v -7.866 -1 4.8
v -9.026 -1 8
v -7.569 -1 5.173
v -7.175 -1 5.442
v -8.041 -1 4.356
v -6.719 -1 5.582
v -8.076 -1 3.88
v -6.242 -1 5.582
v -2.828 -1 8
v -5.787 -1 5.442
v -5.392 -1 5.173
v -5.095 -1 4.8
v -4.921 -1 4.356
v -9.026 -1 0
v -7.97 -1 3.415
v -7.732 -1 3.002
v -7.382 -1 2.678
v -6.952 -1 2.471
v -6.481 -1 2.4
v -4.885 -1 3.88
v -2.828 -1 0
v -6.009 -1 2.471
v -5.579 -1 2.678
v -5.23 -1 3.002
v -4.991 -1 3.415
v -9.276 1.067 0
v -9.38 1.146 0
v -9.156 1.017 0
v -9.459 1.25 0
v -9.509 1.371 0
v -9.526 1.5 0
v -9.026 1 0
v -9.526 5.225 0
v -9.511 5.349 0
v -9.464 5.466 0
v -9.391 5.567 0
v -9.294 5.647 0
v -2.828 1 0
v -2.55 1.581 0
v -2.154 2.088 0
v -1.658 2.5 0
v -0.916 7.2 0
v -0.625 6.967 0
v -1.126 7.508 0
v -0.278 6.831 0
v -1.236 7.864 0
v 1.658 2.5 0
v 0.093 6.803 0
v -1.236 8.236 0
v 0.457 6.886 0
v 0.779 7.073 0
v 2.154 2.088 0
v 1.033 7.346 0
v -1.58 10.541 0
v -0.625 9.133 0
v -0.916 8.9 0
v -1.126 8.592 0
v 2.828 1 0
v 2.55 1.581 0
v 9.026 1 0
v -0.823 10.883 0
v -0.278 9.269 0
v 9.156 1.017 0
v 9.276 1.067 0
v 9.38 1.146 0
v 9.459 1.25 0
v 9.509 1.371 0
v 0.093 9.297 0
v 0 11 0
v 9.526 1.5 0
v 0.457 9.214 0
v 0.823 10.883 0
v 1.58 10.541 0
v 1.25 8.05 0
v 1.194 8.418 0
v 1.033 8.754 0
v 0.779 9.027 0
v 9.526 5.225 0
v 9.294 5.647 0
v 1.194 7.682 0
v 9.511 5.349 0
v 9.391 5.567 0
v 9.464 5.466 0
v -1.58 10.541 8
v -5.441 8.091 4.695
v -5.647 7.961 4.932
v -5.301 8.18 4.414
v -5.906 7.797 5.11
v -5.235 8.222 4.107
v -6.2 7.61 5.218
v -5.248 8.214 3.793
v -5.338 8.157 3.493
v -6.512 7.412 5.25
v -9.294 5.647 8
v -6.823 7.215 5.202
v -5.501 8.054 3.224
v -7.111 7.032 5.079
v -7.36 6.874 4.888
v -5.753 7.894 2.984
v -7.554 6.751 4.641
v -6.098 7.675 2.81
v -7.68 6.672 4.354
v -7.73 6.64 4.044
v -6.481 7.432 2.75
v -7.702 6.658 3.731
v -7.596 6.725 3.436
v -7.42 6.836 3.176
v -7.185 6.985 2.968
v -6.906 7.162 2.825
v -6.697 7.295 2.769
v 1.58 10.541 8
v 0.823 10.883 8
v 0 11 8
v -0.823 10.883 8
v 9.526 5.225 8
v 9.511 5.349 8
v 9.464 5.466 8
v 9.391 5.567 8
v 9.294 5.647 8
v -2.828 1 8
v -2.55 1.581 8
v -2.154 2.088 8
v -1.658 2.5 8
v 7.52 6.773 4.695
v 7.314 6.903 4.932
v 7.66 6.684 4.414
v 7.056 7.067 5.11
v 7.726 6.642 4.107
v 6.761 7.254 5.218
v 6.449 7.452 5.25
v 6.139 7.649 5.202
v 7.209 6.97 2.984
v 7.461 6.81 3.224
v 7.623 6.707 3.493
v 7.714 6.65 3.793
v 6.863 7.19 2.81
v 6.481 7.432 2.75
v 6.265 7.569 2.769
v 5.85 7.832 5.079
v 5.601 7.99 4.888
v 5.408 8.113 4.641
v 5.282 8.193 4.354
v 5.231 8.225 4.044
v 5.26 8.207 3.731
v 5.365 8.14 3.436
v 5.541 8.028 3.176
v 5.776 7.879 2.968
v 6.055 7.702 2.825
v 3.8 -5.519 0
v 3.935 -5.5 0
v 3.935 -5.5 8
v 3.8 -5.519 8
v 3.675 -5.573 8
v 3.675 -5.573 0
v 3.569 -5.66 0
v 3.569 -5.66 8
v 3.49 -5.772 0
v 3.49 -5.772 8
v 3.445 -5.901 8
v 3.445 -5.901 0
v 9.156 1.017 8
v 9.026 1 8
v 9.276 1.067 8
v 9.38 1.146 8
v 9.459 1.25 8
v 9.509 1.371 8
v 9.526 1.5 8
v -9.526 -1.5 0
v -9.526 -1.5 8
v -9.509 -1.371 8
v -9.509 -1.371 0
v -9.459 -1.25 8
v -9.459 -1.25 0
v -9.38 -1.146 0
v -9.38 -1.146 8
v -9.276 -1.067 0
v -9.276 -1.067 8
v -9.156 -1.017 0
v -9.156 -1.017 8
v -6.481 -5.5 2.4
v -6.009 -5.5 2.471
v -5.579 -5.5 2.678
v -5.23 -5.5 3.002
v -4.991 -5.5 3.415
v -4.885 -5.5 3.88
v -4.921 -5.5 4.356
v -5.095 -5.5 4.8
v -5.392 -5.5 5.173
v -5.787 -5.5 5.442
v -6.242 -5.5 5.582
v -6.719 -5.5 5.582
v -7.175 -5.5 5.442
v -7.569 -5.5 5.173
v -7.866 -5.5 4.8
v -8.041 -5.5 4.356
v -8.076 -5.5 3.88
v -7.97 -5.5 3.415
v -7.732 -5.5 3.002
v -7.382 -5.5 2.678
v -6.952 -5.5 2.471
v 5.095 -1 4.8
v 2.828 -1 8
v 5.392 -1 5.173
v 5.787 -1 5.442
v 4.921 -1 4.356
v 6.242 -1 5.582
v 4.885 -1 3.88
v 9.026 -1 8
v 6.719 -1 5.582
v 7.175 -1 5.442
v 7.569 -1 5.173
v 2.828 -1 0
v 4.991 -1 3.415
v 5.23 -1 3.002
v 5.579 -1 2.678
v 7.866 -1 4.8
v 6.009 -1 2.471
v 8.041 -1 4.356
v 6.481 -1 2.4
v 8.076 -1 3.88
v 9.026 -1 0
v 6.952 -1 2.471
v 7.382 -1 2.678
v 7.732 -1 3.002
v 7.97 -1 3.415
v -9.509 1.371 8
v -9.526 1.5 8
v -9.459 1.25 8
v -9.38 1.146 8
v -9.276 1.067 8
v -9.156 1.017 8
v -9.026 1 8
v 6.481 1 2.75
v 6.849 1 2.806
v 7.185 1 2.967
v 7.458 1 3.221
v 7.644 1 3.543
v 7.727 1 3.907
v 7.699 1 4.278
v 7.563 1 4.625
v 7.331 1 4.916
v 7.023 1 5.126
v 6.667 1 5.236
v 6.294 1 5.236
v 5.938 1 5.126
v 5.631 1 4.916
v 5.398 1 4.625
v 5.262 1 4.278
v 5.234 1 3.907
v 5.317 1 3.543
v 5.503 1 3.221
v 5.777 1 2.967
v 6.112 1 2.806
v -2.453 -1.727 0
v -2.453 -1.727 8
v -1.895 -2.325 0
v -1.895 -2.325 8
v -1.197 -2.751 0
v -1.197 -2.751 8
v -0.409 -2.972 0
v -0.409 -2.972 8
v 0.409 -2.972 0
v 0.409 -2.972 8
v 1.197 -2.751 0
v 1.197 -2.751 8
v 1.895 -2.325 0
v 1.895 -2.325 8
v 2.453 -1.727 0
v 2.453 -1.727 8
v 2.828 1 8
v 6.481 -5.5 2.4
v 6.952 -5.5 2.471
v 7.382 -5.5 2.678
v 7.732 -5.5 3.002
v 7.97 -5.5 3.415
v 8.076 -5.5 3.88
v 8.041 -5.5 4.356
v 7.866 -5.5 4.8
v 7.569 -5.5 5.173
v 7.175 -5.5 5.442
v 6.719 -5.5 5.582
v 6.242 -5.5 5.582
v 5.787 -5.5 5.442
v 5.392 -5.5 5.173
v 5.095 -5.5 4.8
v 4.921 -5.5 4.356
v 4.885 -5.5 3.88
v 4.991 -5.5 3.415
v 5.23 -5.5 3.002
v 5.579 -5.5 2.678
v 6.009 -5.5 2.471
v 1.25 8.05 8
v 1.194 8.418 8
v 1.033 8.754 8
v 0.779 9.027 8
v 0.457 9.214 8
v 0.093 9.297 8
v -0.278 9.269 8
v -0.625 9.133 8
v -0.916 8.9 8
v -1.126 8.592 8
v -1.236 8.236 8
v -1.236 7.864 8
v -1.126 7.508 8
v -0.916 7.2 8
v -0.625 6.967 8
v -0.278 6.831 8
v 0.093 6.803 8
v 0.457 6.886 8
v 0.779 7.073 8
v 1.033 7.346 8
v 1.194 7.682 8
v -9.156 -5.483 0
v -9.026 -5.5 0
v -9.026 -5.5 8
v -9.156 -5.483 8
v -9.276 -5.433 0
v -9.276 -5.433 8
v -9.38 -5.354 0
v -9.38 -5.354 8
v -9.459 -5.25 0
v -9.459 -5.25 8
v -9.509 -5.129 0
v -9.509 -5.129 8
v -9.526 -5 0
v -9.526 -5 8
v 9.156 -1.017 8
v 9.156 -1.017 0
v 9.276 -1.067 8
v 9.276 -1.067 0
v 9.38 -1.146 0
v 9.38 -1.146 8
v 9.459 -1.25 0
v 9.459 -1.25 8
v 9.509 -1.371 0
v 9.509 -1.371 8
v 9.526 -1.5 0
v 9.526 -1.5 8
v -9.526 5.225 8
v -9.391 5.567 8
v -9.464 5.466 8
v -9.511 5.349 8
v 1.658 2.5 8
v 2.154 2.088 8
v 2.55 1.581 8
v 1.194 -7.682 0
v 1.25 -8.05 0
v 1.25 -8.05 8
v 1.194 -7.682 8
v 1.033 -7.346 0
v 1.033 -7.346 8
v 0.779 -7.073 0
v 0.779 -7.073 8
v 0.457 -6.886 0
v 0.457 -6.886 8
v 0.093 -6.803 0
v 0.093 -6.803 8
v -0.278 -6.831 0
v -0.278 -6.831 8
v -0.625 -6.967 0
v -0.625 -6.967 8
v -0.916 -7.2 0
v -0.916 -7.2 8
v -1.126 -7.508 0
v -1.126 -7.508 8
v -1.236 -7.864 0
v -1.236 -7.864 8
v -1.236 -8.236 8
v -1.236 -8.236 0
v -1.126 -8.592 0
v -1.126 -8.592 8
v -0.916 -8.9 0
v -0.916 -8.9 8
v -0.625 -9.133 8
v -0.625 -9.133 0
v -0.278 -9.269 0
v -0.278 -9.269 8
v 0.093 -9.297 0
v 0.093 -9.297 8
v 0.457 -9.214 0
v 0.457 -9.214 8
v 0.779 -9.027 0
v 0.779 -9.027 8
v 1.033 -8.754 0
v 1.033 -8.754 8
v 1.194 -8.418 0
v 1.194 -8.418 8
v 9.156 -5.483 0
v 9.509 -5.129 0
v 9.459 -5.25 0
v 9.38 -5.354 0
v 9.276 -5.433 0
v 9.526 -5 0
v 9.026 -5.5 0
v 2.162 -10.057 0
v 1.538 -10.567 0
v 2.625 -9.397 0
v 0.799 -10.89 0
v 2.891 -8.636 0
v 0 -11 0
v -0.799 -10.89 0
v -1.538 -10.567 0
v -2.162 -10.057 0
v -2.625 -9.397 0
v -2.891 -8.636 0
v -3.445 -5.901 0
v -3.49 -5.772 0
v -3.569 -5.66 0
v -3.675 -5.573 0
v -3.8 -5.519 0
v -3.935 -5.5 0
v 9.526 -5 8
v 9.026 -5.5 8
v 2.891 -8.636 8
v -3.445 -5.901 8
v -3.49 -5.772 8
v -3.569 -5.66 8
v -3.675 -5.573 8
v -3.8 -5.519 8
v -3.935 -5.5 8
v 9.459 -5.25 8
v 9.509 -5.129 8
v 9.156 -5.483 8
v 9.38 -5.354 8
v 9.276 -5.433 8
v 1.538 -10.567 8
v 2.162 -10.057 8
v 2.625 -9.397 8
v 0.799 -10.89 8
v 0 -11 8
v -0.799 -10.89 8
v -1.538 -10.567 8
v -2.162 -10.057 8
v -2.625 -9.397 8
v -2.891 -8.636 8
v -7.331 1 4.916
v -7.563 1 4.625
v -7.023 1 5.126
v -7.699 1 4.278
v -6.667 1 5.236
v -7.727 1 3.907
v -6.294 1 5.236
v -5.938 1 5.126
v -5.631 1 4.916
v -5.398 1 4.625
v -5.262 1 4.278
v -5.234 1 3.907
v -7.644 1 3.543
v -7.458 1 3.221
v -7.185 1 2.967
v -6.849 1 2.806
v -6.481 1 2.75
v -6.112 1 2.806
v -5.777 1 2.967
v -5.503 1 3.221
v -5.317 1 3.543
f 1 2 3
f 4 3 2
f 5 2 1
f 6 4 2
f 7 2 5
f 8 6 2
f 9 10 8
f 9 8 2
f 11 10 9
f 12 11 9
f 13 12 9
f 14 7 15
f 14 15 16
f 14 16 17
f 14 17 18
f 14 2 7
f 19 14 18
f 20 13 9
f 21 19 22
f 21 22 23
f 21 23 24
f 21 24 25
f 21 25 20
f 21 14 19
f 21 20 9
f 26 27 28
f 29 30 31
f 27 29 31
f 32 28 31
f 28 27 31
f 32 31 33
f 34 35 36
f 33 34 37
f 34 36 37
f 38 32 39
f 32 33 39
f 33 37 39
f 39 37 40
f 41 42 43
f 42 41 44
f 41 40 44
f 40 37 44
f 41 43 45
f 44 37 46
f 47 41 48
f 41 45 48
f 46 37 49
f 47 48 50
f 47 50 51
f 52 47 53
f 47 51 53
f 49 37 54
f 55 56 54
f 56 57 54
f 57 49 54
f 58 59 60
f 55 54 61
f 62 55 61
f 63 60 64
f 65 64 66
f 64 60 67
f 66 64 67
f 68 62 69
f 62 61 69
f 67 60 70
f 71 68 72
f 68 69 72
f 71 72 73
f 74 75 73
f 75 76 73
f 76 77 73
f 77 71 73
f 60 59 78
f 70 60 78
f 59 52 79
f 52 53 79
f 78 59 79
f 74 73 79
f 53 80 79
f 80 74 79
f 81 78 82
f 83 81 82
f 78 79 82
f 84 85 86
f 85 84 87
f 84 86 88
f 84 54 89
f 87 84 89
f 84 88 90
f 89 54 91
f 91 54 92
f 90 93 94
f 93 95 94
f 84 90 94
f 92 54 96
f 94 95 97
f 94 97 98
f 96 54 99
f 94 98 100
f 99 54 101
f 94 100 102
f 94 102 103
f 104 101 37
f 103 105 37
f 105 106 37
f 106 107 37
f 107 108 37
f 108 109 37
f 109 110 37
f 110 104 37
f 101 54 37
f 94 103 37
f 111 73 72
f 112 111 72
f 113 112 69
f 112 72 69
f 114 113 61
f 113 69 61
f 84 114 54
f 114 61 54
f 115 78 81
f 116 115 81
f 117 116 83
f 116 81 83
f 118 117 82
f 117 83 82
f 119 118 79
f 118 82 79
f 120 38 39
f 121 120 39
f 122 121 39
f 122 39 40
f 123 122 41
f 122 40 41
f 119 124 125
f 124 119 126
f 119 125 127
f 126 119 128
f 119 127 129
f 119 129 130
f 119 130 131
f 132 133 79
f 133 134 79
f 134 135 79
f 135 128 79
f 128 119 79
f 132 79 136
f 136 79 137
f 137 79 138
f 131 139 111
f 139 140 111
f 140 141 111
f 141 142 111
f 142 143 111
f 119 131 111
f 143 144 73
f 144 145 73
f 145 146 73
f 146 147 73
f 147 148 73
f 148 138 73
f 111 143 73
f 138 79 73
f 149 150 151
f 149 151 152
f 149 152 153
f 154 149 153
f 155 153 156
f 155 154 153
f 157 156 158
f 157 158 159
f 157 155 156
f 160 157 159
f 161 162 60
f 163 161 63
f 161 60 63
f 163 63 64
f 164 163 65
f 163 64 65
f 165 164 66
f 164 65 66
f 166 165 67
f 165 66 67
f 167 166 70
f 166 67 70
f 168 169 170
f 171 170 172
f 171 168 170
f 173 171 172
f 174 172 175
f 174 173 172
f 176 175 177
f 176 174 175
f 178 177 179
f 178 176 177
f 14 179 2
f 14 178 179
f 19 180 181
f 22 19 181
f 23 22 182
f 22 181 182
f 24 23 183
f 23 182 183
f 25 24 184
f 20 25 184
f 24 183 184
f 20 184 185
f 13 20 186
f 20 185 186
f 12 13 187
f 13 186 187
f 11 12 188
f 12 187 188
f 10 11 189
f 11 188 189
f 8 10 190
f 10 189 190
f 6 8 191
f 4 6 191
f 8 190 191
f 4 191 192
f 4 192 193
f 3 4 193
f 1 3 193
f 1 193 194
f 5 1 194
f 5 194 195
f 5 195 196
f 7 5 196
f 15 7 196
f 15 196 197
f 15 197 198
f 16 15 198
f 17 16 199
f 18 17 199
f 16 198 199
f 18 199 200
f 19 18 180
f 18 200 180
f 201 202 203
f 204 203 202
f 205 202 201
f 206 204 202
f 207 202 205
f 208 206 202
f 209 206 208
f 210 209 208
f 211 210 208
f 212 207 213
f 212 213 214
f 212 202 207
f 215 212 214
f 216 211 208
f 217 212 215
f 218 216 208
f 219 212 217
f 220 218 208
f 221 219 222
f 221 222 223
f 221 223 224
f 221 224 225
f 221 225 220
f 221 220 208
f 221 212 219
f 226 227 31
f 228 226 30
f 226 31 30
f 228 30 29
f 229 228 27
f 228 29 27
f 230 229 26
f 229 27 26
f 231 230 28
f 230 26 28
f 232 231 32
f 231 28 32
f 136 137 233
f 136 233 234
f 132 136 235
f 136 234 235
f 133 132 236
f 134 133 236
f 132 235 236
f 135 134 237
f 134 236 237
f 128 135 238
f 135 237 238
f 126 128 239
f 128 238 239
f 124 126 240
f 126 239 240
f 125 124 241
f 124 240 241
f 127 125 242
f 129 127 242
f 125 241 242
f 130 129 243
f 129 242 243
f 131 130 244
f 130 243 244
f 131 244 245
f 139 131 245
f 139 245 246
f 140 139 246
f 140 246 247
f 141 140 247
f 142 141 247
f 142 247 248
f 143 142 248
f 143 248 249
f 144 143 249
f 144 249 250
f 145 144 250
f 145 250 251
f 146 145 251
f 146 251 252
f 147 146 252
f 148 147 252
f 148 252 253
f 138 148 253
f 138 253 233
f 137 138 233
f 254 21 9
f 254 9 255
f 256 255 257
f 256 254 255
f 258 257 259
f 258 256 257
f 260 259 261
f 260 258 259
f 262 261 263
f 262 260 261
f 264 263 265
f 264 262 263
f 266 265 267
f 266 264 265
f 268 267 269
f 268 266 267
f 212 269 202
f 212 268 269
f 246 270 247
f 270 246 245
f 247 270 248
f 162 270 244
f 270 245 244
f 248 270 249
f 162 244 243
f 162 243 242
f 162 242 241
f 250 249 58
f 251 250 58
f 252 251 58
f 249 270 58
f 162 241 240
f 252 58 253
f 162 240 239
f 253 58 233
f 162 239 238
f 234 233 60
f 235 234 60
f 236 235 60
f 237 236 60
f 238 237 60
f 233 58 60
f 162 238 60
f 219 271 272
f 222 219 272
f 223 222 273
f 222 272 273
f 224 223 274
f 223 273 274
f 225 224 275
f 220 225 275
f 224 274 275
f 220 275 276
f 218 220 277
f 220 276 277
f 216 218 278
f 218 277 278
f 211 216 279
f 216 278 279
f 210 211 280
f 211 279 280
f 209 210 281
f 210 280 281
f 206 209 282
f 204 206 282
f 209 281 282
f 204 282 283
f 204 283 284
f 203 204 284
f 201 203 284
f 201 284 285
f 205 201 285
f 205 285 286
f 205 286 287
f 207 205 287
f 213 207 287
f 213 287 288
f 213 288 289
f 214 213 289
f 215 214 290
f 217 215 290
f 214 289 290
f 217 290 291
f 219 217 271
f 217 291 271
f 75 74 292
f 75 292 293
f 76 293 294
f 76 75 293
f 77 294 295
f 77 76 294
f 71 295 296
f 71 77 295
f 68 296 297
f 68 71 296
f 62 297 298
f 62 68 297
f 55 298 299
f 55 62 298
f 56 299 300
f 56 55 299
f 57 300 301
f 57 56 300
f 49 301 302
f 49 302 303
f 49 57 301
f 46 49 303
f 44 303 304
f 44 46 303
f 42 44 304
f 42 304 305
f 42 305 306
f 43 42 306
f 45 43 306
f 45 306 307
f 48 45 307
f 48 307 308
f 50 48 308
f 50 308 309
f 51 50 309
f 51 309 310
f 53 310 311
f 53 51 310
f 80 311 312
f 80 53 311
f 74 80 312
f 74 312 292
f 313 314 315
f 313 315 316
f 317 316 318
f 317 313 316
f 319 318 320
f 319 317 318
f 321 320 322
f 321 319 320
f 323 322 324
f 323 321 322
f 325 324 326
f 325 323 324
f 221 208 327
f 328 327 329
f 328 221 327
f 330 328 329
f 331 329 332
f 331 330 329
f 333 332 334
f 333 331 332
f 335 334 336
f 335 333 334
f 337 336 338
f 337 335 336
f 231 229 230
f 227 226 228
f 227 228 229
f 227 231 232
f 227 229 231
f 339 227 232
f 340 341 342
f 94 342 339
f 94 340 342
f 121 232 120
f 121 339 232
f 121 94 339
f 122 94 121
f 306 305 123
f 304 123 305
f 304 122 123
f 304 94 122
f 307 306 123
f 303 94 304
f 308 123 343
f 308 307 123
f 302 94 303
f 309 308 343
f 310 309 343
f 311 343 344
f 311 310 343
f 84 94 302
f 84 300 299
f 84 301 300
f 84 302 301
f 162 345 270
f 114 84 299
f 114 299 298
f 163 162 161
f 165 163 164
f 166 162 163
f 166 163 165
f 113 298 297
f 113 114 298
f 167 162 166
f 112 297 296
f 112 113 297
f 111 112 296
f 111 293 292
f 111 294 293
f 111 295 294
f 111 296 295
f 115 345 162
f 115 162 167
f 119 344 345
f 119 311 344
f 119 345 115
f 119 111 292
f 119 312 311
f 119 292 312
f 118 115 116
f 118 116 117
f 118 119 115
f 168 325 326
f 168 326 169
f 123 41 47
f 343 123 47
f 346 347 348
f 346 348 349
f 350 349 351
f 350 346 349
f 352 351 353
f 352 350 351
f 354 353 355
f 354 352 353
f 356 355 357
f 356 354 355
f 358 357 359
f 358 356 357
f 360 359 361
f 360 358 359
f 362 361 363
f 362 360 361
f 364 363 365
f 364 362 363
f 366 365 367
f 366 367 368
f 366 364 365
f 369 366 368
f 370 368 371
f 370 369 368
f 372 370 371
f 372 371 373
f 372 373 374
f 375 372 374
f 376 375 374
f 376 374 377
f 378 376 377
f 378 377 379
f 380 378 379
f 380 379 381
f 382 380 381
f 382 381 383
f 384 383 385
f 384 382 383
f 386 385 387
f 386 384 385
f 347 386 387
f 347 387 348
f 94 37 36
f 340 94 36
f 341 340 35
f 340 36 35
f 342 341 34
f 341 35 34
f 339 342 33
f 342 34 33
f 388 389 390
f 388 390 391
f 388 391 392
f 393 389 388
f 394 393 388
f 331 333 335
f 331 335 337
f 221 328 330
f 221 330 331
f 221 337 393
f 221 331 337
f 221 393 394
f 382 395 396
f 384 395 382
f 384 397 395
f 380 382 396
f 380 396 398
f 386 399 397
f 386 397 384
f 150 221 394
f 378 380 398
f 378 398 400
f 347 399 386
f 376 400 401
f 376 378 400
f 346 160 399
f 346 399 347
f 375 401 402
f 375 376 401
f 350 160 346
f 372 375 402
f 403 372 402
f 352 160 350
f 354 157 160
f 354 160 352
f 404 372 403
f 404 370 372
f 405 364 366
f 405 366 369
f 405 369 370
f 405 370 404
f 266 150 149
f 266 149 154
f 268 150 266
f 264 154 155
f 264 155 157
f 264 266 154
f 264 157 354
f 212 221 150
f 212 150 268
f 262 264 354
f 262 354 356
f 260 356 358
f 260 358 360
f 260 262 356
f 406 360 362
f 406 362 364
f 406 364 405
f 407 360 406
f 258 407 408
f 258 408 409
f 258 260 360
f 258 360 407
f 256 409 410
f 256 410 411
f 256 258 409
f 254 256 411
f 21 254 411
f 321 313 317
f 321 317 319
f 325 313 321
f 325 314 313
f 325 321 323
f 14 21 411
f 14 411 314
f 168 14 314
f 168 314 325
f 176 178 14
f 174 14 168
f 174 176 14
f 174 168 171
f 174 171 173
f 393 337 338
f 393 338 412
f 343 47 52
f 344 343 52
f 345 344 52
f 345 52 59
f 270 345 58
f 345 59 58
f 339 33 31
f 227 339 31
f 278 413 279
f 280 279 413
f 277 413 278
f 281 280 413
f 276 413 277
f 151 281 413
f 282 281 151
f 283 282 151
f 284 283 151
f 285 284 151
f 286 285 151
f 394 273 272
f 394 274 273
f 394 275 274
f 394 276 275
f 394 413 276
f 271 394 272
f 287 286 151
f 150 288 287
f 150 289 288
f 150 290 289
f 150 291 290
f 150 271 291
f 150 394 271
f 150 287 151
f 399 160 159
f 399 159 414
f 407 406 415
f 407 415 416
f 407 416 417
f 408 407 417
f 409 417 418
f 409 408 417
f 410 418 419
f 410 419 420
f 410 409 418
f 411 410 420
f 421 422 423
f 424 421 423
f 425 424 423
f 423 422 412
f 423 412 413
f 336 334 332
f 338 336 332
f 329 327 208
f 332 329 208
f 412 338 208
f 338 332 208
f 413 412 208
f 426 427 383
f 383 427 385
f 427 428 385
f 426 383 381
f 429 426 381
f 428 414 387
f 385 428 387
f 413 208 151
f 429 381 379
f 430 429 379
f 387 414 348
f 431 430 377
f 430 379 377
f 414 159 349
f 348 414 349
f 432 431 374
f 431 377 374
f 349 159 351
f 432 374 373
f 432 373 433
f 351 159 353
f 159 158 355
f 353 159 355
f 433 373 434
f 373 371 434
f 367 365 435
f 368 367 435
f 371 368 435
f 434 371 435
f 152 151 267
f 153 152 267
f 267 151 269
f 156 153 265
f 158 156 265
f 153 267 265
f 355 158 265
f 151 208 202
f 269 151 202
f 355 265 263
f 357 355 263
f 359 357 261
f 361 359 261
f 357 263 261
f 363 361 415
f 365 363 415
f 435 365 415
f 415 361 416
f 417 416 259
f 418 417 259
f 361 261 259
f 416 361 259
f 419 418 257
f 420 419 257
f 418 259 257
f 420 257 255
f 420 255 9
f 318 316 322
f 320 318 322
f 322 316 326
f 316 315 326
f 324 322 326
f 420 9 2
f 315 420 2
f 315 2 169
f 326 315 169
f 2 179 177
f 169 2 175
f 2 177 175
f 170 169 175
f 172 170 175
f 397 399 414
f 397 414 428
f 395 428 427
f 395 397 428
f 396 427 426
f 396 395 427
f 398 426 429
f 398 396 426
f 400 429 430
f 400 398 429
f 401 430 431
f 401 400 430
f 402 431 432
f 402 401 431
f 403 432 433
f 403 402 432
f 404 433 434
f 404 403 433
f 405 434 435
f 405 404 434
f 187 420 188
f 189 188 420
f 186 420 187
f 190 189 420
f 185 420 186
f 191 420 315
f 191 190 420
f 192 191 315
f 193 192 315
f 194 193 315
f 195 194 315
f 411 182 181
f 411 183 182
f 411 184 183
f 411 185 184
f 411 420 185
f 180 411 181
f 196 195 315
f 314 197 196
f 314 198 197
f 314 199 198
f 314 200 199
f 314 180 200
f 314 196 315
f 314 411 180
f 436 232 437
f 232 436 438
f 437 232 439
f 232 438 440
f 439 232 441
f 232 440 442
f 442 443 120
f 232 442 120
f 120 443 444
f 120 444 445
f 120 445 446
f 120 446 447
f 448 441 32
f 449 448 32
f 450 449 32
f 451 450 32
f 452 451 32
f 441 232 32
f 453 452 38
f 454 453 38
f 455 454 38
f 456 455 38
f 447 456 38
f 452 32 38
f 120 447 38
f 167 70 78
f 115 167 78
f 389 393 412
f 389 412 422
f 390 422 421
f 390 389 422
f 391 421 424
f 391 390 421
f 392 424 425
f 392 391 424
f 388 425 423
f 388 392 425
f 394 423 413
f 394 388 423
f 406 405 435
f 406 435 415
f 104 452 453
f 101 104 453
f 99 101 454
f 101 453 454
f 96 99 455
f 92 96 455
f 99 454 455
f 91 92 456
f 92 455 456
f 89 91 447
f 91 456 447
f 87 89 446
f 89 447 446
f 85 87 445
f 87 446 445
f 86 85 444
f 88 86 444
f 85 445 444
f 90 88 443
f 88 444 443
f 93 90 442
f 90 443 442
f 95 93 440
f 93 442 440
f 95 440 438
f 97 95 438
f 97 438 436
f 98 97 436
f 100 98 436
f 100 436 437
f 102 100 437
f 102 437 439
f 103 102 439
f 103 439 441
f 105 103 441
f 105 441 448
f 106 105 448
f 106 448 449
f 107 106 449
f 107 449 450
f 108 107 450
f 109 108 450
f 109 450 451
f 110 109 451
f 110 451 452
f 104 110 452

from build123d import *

# Parameters (mm, degrees)
SKETCH_1_R          = 1.25
EXTRUDE_1_DEPTH     = 8
EXTRUDE_1_2_DEPTH   = 8
SKETCH_2_R          = 1.25
CUT_EXTRUDE_1_DEPTH = 21.66397832
SKETCH_3_R          = 1.6
CUT_EXTRUDE_2_DEPTH = 4.5


with BuildPart() as part:
    # 草图1 → 凸台-拉伸1 (new body)
    with BuildSketch(Plane.XY):
        with BuildLine():
            Line((-1.658312395, 2.5), (1.658312395, 2.5))
            ThreePointArc((1.658312395, 2.5), (2.365419176, 1.84520788), (2.828427125, 1))
            Line((2.828427125, 1), (9.026279442, 1))
            ThreePointArc((9.026279442, 1), (9.379832832, 1.146446609), (9.526279442, 1.5))
            Line((9.526279442, 1.5), (9.526279442, 5.22507425))
            ThreePointArc((9.526279442, 5.22507425), (9.464414867, 5.465983671), (9.294130046, 5.647278056))
            Line((9.294130046, 5.647278056), (1.580318565, 10.541002455))
            ThreePointArc((1.580318565, 10.541002455), (0, 11), (-1.580318565, 10.541002455))
            Line((-1.580318565, 10.541002455), (-9.294130046, 5.647278056))
            ThreePointArc((-9.294130046, 5.647278056), (-9.464414867, 5.465983671), (-9.526279442, 5.22507425))
            Line((-9.526279442, 5.22507425), (-9.526279442, 1.5))
            ThreePointArc((-9.526279442, 1.5), (-9.379832832, 1.146446609), (-9.026279442, 1))
            Line((-9.026279442, 1), (-2.828427125, 1))
            ThreePointArc((-2.828427125, 1), (-2.365419176, 1.84520788), (-1.658312395, 2.5))
        make_face()
        with Locations((0, 8.05)):
            Circle(SKETCH_1_R, mode=Mode.SUBTRACT)
    extrude(amount=EXTRUDE_1_DEPTH)


with BuildPart() as body_2:
    # 草图1 → Extrude 1 2 (new body)
    with BuildSketch(Plane.XY):
        with BuildLine():
            Line((-9.026279442, -1), (-2.828427125, -1))
            ThreePointArc((-2.828427125, -1), (0, -3), (2.828427125, -1))
            Line((2.828427125, -1), (9.026279442, -1))
            ThreePointArc((9.026279442, -1), (9.379832832, -1.146446609), (9.526279442, -1.5))
            Line((9.526279442, -1.5), (9.526279442, -5))
            ThreePointArc((9.526279442, -5), (9.379832832, -5.353553391), (9.026279442, -5.5))
            Line((9.026279442, -5.5), (3.935174447, -5.5))
            ThreePointArc((3.935174447, -5.5), (3.6186464, -5.612947037), (3.445121974, -5.900760016))
            Line((3.445121974, -5.900760016), (2.891309587, -8.635515904))
            ThreePointArc((2.891309587, -8.635515904), (0, -11), (-2.891309587, -8.635515904))
            Line((-2.891309587, -8.635515904), (-3.445121974, -5.900760016))
            ThreePointArc((-3.445121974, -5.900760016), (-3.6186464, -5.612947037), (-3.935174447, -5.5))
            Line((-3.935174447, -5.5), (-9.026279442, -5.5))
            ThreePointArc((-9.026279442, -5.5), (-9.379832832, -5.353553391), (-9.526279442, -5))
            Line((-9.526279442, -5), (-9.526279442, -1.5))
            ThreePointArc((-9.526279442, -1.5), (-9.379832832, -1.146446609), (-9.026279442, -1))
        make_face()
        with Locations((0, -8.05)):
            Circle(SKETCH_1_R, mode=Mode.SUBTRACT)
    extrude(amount=EXTRUDE_1_2_DEPTH)


with BuildPart() as cut_extrude_1_tool:
    # 草图2 → 切除-拉伸1 (new, through all)
    with BuildSketch(Plane.XZ.offset(5.5)):
        with Locations(Location((6.480726944, 4, 0), (0, 0, 270))):
            Circle(SKETCH_2_R)
        with Locations(Location((-6.480726944, 4, 0), (0, 0, 270))):
            Circle(SKETCH_2_R)
    extrude(amount=-CUT_EXTRUDE_1_DEPTH)


with BuildPart() as part_1:
    add(part.part)

    # 切除-拉伸1: cut by cut_extrude_1_tool
    add(cut_extrude_1_tool.part, mode=Mode.SUBTRACT)


with BuildPart() as body_2_1:
    add(body_2.part)

    # 切除-拉伸1: cut by cut_extrude_1_tool
    add(cut_extrude_1_tool.part, mode=Mode.SUBTRACT)

    # 草图3 → 切除-拉伸2 (cut)
    with BuildSketch(Plane.XZ.offset(5.5)):
        with Locations(Location((-6.480726944, 4, 0), (0, 0, 270))):
            Circle(SKETCH_3_R)
        with Locations(Location((6.480726944, 4, 0), (0, 0, 270))):
            Circle(SKETCH_3_R)
    extrude(amount=-CUT_EXTRUDE_2_DEPTH, mode=Mode.SUBTRACT)


solid = Compound([part_1.part, body_2_1.part])
